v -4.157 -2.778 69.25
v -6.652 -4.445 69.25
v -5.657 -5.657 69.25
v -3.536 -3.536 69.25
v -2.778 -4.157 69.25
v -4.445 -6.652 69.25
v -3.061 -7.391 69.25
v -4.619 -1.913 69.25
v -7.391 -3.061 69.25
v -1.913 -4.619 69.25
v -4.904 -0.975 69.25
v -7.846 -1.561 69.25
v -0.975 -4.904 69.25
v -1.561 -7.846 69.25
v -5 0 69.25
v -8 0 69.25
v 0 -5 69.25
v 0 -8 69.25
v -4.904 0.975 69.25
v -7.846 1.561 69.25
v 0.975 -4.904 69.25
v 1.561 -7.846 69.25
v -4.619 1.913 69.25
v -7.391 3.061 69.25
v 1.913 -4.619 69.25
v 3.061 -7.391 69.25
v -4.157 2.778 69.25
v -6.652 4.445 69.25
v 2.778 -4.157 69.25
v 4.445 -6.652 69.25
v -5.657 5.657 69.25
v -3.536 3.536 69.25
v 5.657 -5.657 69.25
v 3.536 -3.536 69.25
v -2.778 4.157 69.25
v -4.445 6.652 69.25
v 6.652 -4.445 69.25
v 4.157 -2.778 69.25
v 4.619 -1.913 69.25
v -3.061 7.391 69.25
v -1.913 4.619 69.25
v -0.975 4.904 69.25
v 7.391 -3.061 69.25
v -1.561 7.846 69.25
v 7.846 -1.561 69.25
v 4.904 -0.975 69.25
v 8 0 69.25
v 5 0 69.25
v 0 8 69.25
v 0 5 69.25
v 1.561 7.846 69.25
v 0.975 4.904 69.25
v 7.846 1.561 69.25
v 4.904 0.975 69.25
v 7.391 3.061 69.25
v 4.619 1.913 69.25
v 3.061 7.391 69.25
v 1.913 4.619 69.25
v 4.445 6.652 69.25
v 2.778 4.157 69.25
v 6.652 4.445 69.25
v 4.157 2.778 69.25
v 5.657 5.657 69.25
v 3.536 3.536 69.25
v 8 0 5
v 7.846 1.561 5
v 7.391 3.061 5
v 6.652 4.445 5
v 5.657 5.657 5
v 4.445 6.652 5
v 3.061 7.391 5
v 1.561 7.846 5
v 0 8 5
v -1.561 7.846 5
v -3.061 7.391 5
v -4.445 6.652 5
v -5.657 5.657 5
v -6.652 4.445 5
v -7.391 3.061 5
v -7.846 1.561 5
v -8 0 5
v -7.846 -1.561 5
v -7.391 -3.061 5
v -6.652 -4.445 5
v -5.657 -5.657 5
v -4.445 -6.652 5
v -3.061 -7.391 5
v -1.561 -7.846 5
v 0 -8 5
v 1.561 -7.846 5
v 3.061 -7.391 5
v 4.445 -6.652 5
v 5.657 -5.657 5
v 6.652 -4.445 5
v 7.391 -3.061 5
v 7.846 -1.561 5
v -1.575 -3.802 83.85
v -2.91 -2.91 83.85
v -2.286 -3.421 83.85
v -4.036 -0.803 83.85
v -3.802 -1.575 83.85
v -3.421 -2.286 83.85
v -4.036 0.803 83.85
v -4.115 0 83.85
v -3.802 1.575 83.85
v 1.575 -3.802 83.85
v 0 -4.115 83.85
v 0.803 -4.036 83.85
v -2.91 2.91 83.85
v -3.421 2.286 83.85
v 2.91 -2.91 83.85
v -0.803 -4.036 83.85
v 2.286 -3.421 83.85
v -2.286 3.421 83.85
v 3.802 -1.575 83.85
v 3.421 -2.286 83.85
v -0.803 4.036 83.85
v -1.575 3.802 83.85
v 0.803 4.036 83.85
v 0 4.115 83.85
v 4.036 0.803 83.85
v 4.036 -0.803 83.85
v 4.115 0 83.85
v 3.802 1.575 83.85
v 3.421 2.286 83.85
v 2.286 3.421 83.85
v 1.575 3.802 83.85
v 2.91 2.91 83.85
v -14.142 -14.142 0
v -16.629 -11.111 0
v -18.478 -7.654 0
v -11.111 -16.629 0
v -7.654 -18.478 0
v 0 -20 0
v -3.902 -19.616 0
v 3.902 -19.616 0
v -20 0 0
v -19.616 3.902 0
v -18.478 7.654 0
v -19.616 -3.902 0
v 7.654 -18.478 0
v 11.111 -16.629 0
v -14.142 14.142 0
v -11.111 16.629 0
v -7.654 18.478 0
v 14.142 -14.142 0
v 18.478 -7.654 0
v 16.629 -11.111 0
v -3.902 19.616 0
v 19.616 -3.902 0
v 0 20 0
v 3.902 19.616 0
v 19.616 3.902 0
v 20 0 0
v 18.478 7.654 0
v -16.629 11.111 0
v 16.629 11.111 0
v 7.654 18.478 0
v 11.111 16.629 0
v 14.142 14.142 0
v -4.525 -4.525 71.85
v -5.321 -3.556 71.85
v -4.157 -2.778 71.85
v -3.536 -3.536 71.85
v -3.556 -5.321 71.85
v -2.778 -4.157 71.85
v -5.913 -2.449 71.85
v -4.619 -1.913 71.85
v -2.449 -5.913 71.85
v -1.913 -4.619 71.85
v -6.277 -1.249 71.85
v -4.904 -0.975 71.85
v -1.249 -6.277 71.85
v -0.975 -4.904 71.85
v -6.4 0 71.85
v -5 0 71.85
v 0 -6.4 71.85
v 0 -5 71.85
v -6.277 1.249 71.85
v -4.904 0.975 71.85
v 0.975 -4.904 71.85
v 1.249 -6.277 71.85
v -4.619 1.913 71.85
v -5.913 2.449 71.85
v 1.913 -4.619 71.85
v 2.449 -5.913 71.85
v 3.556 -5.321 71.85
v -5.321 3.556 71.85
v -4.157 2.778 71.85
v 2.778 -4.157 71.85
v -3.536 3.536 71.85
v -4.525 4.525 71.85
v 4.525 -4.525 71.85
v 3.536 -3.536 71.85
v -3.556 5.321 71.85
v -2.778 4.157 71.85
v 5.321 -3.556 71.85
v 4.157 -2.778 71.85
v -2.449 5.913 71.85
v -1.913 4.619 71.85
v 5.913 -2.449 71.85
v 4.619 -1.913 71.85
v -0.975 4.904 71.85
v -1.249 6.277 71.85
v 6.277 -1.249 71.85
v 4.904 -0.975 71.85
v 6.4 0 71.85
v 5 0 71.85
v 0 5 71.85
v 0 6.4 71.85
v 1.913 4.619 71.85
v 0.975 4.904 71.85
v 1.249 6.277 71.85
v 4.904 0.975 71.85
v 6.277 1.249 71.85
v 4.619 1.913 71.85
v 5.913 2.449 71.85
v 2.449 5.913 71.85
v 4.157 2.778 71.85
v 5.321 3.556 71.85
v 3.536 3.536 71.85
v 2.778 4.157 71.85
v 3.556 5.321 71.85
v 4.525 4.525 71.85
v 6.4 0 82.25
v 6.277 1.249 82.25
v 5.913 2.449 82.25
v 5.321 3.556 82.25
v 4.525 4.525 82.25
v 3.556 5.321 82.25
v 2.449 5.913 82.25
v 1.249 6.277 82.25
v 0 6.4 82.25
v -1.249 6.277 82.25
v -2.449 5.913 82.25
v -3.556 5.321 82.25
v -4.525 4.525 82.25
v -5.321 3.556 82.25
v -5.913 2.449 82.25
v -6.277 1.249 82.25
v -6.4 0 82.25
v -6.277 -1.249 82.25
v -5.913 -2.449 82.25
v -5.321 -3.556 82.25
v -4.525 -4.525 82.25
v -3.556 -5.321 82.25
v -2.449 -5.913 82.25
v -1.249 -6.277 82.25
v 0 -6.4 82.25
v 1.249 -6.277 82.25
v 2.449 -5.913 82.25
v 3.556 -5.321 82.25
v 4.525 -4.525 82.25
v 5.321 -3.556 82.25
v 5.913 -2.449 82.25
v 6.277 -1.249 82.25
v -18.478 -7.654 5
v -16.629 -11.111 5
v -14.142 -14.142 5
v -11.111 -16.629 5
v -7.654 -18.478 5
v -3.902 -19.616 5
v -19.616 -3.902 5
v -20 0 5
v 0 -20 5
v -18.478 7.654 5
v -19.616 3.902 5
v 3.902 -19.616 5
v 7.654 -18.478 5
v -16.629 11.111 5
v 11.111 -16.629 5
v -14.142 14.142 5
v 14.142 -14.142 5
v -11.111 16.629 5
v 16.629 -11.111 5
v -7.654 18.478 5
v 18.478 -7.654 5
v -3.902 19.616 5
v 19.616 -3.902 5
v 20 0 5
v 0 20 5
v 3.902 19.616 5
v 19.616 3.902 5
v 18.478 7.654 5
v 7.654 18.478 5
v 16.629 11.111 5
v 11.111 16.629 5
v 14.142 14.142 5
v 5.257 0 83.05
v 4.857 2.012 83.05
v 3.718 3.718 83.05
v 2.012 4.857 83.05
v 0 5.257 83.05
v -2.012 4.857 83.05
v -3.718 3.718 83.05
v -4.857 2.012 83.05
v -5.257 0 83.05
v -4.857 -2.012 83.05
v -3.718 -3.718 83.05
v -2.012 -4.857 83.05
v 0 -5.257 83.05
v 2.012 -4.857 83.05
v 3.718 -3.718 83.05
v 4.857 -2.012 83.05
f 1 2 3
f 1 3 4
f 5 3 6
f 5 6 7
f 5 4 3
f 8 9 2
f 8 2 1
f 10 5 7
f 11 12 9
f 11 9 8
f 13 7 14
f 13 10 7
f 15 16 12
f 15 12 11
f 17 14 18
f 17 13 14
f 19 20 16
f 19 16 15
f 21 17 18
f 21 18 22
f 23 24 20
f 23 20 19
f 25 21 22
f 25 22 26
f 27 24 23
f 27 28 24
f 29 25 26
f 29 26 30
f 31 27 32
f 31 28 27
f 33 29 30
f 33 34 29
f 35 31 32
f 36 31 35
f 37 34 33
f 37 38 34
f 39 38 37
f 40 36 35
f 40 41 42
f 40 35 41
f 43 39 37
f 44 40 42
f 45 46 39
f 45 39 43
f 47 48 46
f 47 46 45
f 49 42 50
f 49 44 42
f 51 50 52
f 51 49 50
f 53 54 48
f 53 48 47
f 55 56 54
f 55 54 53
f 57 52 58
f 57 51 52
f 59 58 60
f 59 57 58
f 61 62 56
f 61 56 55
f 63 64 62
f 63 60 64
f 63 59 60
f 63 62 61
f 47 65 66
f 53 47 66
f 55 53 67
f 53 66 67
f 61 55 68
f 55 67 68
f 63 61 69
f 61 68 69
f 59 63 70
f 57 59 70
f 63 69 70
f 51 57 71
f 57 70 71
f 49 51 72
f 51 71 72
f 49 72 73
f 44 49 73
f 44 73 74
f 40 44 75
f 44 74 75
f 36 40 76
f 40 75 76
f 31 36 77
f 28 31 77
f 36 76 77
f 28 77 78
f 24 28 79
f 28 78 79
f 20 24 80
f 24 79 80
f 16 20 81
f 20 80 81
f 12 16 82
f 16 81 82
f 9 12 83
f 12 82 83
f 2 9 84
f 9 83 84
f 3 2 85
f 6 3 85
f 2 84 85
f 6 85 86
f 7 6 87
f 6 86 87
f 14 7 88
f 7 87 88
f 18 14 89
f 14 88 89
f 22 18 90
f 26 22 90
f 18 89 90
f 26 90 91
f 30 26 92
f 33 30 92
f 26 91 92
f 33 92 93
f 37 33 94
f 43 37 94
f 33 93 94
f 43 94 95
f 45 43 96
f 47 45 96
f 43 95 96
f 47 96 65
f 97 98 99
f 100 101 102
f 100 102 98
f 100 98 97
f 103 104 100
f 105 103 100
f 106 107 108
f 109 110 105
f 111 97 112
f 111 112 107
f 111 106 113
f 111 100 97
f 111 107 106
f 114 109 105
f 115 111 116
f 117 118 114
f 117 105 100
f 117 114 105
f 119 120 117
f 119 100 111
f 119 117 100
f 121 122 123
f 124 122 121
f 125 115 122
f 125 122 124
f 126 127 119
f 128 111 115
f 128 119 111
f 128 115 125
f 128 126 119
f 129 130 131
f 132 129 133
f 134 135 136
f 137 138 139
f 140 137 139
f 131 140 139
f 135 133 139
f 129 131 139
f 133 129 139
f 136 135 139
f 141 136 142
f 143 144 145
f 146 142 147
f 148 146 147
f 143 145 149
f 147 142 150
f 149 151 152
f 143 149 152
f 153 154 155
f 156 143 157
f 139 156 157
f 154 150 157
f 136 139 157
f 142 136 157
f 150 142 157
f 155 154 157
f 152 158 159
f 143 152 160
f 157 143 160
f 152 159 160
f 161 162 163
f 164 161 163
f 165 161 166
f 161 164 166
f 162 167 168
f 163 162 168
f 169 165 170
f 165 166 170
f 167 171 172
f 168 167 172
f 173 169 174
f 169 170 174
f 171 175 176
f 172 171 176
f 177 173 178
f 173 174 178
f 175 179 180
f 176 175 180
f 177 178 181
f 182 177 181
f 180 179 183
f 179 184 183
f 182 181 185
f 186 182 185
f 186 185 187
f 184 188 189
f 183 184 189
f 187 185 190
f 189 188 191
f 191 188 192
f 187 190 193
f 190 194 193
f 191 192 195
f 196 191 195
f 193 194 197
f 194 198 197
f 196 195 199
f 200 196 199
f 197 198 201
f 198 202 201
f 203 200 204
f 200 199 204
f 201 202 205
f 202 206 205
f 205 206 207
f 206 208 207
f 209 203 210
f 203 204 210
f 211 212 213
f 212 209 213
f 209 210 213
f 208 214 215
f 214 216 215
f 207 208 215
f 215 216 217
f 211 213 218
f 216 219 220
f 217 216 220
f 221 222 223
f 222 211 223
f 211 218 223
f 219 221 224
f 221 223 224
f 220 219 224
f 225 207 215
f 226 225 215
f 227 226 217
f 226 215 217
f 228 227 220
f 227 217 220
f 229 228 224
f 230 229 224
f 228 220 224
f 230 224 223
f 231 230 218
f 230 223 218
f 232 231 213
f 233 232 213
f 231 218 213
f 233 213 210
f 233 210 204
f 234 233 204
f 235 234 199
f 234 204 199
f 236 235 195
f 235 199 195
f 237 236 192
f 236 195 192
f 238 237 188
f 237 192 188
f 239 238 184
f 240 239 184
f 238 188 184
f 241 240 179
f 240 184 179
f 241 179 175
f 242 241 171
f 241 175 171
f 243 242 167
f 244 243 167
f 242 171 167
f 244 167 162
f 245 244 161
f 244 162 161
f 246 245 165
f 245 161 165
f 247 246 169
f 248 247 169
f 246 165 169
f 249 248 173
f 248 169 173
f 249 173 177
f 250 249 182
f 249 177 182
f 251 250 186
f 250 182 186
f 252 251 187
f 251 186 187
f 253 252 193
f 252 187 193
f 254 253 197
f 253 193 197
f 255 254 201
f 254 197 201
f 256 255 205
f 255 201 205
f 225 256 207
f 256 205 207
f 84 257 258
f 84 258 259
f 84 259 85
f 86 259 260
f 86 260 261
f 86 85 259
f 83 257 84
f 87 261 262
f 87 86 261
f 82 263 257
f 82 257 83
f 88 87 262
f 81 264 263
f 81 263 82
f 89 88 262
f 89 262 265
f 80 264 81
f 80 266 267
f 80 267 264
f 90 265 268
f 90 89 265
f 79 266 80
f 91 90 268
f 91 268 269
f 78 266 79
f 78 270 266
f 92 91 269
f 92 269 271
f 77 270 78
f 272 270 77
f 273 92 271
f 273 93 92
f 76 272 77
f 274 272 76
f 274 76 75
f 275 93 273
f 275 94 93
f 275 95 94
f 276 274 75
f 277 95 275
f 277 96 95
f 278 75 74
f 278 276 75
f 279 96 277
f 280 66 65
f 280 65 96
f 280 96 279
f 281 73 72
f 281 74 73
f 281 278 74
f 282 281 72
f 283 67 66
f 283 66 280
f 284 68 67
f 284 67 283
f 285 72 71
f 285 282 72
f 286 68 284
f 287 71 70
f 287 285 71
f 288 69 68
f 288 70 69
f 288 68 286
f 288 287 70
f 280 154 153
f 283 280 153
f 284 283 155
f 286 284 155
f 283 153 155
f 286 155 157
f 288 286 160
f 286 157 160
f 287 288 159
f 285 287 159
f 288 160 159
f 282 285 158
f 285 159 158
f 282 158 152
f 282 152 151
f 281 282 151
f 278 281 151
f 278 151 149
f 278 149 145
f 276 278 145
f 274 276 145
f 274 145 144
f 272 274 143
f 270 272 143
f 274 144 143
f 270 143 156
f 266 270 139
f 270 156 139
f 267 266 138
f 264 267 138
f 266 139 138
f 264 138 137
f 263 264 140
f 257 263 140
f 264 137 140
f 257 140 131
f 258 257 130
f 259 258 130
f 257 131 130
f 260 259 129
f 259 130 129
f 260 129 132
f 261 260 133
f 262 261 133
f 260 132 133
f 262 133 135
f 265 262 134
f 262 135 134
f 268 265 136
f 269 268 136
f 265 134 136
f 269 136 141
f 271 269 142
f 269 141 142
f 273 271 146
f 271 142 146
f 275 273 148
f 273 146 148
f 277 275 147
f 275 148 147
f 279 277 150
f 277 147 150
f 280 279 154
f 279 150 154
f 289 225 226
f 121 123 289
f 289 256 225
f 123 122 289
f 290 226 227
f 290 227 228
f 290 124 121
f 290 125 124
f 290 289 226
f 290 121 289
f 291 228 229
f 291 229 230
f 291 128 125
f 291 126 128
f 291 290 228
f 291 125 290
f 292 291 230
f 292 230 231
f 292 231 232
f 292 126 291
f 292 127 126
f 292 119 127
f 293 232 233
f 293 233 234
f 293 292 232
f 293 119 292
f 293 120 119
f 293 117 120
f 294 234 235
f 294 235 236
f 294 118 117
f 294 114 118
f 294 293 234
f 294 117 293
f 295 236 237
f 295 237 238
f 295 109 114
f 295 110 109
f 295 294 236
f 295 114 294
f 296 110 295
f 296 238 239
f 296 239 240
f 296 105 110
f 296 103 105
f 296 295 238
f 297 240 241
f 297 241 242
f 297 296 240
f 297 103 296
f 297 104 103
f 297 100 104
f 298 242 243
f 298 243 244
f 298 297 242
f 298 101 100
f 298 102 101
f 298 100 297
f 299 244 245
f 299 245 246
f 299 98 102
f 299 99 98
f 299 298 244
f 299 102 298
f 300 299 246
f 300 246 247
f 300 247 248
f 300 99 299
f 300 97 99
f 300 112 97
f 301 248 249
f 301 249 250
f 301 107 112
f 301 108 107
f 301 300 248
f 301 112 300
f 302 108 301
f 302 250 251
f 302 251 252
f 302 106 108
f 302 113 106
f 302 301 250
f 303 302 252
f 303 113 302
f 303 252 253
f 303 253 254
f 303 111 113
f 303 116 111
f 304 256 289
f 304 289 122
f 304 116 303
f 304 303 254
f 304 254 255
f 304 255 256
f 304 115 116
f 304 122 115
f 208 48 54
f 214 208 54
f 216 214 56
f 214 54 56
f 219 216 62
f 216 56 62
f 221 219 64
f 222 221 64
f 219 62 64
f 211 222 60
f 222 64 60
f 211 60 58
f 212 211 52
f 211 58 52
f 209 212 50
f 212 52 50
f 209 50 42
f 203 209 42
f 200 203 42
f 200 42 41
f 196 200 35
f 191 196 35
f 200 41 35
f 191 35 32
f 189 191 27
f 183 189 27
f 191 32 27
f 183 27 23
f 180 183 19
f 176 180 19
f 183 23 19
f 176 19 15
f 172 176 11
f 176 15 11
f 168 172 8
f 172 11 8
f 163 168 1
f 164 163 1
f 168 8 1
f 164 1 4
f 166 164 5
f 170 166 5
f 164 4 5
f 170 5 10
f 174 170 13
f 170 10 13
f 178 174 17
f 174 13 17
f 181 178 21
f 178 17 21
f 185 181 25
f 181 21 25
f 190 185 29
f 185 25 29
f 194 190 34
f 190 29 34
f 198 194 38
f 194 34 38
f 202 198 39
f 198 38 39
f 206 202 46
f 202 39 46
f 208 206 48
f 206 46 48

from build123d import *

# Parameters (mm, degrees)
ESQUISSE1_R        = 20
BOSS_EXTRU_1_DEPTH = 5
ESQUISSE2_R        = 8
BOSS_EXTRU_2_DEPTH = 64.25
ESQUISSE3_R        = 5
BOSS_EXTRU_3_DEPTH = 2.6
ESQUISSE4_R        = 6.4
BOSS_EXTRU_4_DEPTH = 12
CHANFREIN1_SIZE    = 1.6
CHANFREIN1_SIZE2   = 2.285036811


with BuildPart() as part:
    # Esquisse1 → Boss.-Extru.1 (new body)
    with BuildSketch(Plane.XY):
        Circle(ESQUISSE1_R)
    extrude(amount=BOSS_EXTRU_1_DEPTH)

    # Esquisse2 → Boss.-Extru.2 (add)
    with BuildSketch(Plane.XY.offset(5)):
        Circle(ESQUISSE2_R)
    extrude(amount=BOSS_EXTRU_2_DEPTH)

    # Esquisse3 → Boss.-Extru.3 (add)
    with BuildSketch(Plane.XY.offset(69.25)):
        Circle(ESQUISSE3_R)
    extrude(amount=BOSS_EXTRU_3_DEPTH)

    # Esquisse4 → Boss.-Extru.4 (add)
    with BuildSketch(Plane.XY.offset(71.85)):
        Circle(ESQUISSE4_R)
    extrude(amount=BOSS_EXTRU_4_DEPTH)

    # Chanfrein1
    chanfrein1_edges = [part.edges().sort_by_distance(p)[0] for p in [
        (-6.4, 0, 83.85),
    ]]
    chanfrein1_side = [part.faces().sort_by_distance(p)[0] for p in [
        (-6.4, 0, 77.85),
    ]]
    chamfer(chanfrein1_edges, length=CHANFREIN1_SIZE, length2=CHANFREIN1_SIZE2, reference=chanfrein1_side[0])


solid = part.part
